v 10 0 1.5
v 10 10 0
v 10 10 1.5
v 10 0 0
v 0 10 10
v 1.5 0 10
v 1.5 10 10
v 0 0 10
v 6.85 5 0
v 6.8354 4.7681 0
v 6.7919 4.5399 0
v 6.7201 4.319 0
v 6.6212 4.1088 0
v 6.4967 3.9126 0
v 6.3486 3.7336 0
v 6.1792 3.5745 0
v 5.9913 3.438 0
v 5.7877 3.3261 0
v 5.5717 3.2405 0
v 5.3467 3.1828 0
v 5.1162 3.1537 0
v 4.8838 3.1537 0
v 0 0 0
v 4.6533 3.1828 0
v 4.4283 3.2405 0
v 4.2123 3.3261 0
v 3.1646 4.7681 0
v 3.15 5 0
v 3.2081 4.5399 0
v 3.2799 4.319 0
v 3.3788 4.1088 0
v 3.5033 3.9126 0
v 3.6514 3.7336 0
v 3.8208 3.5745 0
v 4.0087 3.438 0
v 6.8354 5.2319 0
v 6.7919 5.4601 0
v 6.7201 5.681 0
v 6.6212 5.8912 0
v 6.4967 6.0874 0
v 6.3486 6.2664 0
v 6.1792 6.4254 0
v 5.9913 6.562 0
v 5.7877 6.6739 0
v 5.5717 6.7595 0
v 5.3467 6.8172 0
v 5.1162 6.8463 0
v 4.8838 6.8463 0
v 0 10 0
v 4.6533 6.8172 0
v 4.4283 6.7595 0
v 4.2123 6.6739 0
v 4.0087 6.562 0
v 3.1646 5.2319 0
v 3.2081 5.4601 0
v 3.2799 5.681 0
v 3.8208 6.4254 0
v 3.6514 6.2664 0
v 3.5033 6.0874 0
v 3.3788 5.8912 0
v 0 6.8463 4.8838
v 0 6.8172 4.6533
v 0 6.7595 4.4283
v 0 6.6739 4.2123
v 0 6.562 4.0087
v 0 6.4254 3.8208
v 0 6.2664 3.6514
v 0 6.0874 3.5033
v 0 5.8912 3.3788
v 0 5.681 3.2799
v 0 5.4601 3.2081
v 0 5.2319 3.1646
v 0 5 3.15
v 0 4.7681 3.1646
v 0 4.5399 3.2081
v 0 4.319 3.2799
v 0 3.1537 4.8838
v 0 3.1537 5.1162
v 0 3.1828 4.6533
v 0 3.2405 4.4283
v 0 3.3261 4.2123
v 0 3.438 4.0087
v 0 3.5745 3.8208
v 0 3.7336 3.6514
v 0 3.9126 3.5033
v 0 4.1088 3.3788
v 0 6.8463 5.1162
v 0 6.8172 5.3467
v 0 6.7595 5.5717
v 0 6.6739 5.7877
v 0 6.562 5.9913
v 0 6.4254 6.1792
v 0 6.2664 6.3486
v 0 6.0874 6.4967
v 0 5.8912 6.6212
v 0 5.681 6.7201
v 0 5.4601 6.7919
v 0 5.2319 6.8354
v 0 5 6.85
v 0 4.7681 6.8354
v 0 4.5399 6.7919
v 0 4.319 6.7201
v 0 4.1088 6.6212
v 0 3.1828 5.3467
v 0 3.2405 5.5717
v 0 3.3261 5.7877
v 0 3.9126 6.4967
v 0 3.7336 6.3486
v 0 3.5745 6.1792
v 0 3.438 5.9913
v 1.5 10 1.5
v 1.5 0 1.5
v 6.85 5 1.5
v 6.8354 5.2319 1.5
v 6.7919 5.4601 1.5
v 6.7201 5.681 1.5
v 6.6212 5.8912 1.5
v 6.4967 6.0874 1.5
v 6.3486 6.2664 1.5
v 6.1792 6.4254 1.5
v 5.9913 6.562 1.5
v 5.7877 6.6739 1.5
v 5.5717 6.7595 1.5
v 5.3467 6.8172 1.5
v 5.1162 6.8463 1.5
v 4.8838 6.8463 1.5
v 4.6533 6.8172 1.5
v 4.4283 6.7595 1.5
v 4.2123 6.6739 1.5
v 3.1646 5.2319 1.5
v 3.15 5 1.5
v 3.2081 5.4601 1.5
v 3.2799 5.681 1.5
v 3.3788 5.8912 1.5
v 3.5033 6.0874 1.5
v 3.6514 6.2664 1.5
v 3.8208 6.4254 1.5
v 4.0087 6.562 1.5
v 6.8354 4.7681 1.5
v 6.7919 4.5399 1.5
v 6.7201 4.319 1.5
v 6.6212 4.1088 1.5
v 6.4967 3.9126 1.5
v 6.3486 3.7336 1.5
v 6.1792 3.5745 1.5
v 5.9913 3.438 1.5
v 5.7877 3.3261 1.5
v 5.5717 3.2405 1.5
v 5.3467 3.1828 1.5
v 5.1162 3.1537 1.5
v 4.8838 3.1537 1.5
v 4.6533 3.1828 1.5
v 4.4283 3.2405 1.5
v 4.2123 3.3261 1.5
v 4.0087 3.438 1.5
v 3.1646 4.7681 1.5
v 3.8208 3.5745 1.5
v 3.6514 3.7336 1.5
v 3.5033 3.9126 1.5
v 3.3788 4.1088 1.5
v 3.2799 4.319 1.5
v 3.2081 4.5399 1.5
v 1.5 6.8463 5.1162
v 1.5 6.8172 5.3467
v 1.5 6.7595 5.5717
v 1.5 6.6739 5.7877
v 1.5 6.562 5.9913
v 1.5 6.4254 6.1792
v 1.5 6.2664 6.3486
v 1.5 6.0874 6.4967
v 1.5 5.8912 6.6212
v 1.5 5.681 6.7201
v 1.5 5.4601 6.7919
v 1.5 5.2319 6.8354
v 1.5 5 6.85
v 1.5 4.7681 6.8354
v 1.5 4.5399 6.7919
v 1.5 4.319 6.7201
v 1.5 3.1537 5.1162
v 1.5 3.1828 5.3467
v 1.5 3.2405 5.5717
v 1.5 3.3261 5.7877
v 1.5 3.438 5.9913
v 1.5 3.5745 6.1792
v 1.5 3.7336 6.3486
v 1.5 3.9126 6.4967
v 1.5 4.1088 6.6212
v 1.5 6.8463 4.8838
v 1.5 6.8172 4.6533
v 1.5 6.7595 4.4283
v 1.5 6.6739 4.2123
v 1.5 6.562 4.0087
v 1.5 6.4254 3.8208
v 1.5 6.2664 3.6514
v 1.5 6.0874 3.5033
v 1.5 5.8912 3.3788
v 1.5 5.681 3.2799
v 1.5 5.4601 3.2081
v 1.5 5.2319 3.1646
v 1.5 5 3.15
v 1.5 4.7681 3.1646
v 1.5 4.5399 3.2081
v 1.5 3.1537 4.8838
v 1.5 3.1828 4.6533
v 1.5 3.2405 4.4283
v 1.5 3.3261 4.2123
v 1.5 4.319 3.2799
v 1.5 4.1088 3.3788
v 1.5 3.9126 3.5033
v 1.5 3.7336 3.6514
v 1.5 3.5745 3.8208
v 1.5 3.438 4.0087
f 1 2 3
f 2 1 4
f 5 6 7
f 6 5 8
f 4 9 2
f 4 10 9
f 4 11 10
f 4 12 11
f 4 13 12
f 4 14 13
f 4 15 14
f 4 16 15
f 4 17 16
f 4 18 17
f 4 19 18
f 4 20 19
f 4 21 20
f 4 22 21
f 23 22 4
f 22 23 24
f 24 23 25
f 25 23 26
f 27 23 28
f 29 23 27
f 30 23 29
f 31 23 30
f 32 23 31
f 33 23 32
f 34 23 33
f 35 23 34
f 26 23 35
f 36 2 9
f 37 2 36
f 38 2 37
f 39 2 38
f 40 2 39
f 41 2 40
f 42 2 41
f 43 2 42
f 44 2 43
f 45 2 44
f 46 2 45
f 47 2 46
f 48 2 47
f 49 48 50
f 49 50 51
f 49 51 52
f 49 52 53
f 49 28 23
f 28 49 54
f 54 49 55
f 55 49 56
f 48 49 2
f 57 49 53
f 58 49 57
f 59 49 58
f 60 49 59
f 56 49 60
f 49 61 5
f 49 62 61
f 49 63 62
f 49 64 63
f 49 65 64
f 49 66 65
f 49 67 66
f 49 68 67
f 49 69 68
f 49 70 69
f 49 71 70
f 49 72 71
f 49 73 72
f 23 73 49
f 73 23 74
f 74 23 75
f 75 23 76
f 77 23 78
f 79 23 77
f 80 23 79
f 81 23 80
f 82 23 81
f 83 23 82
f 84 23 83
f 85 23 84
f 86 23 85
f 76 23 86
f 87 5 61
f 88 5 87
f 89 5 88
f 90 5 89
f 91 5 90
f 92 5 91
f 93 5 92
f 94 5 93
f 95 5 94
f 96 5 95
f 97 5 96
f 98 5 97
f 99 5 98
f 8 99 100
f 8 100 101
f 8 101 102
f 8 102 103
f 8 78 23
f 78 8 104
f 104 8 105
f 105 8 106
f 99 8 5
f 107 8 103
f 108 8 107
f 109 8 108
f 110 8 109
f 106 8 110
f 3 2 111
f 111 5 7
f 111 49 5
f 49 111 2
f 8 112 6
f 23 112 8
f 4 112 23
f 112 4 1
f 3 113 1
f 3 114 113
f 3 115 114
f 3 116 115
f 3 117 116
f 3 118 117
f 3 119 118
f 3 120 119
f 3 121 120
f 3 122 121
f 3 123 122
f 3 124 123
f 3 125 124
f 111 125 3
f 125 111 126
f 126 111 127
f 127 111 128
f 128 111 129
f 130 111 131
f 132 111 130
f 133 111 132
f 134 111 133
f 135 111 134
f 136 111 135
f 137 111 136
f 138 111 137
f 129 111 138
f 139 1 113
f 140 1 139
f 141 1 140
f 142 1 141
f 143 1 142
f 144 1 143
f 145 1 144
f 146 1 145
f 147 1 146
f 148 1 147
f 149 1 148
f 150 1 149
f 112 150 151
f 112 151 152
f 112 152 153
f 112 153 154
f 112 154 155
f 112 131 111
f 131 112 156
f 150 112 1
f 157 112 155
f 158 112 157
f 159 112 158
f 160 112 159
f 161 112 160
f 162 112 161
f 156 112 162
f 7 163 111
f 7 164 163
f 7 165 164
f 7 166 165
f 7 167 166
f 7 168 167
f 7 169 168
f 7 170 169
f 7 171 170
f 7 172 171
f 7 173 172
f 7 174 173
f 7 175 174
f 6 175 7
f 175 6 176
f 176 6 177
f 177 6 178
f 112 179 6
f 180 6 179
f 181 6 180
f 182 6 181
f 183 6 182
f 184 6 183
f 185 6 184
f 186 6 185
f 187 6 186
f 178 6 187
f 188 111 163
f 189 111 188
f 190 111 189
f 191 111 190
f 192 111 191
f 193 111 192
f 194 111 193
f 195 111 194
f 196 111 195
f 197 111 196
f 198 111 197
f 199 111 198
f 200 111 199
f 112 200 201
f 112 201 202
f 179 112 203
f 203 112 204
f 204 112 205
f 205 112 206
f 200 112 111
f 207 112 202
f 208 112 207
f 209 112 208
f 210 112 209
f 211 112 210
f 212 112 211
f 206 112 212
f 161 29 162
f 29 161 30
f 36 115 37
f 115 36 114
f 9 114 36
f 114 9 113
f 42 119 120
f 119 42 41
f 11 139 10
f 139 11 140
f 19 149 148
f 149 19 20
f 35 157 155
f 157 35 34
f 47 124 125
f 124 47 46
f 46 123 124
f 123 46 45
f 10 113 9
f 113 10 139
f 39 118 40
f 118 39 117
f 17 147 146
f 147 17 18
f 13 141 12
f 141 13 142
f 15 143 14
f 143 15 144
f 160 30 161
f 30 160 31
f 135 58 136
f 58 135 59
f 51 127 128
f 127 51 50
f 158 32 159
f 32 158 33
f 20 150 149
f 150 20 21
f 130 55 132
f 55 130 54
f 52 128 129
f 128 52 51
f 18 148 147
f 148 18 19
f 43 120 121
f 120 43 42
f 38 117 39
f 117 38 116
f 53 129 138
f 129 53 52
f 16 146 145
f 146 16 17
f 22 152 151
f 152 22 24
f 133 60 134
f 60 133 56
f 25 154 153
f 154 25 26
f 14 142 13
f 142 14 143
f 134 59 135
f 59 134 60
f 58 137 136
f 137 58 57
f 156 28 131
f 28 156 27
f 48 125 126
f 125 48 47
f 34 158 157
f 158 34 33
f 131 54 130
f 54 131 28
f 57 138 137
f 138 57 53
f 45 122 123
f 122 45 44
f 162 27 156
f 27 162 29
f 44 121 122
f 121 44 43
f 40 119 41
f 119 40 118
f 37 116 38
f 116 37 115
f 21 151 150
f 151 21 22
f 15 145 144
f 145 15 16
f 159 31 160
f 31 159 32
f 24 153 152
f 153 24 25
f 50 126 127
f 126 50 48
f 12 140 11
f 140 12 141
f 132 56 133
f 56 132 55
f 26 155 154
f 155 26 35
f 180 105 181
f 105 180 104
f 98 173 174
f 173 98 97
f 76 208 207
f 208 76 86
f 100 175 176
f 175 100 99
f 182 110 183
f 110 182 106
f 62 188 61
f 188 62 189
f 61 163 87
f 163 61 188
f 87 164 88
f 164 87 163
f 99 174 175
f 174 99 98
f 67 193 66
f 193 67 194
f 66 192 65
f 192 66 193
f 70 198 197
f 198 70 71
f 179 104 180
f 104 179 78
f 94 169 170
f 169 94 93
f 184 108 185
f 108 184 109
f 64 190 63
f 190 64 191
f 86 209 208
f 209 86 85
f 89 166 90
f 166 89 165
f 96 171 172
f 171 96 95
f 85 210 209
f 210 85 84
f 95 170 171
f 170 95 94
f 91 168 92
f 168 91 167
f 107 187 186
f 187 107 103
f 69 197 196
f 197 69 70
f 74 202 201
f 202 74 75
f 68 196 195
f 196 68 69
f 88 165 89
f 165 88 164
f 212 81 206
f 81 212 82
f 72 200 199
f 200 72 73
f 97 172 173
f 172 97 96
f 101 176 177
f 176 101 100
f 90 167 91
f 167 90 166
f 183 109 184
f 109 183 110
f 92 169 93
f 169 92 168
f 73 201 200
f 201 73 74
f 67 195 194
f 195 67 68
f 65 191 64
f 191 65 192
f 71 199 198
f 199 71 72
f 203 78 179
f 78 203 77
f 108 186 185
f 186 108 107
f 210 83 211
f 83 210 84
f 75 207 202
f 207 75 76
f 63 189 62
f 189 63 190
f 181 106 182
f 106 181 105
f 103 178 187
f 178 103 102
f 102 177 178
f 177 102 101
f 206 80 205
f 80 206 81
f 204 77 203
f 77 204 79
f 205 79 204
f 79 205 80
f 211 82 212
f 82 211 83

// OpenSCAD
// Resolution
$fn=50;

// Properties
wall_thickness = 1.5 ;
rail_size = 10;
bracket_length = 10;
m3_clear = 3.7/2;

difference(){
    // Bracket
    cube([rail_size, bracket_length, rail_size]);
    
    // Cutout
    translate([wall_thickness,0,wall_thickness])
    cube([rail_size-wall_thickness, bracket_length, rail_size-wall_thickness]);
    
    // Screw holes
    translate([rail_size/2, rail_size/2, 0])
    cylinder(h=2*wall_thickness, r1=m3_clear, r2=m3_clear);
    
    rotate([0,-90,0])
    translate([rail_size/2, rail_size/2, -wall_thickness])
    cylinder(h=wall_thickness*2, r1=m3_clear, r2=m3_clear);
}
